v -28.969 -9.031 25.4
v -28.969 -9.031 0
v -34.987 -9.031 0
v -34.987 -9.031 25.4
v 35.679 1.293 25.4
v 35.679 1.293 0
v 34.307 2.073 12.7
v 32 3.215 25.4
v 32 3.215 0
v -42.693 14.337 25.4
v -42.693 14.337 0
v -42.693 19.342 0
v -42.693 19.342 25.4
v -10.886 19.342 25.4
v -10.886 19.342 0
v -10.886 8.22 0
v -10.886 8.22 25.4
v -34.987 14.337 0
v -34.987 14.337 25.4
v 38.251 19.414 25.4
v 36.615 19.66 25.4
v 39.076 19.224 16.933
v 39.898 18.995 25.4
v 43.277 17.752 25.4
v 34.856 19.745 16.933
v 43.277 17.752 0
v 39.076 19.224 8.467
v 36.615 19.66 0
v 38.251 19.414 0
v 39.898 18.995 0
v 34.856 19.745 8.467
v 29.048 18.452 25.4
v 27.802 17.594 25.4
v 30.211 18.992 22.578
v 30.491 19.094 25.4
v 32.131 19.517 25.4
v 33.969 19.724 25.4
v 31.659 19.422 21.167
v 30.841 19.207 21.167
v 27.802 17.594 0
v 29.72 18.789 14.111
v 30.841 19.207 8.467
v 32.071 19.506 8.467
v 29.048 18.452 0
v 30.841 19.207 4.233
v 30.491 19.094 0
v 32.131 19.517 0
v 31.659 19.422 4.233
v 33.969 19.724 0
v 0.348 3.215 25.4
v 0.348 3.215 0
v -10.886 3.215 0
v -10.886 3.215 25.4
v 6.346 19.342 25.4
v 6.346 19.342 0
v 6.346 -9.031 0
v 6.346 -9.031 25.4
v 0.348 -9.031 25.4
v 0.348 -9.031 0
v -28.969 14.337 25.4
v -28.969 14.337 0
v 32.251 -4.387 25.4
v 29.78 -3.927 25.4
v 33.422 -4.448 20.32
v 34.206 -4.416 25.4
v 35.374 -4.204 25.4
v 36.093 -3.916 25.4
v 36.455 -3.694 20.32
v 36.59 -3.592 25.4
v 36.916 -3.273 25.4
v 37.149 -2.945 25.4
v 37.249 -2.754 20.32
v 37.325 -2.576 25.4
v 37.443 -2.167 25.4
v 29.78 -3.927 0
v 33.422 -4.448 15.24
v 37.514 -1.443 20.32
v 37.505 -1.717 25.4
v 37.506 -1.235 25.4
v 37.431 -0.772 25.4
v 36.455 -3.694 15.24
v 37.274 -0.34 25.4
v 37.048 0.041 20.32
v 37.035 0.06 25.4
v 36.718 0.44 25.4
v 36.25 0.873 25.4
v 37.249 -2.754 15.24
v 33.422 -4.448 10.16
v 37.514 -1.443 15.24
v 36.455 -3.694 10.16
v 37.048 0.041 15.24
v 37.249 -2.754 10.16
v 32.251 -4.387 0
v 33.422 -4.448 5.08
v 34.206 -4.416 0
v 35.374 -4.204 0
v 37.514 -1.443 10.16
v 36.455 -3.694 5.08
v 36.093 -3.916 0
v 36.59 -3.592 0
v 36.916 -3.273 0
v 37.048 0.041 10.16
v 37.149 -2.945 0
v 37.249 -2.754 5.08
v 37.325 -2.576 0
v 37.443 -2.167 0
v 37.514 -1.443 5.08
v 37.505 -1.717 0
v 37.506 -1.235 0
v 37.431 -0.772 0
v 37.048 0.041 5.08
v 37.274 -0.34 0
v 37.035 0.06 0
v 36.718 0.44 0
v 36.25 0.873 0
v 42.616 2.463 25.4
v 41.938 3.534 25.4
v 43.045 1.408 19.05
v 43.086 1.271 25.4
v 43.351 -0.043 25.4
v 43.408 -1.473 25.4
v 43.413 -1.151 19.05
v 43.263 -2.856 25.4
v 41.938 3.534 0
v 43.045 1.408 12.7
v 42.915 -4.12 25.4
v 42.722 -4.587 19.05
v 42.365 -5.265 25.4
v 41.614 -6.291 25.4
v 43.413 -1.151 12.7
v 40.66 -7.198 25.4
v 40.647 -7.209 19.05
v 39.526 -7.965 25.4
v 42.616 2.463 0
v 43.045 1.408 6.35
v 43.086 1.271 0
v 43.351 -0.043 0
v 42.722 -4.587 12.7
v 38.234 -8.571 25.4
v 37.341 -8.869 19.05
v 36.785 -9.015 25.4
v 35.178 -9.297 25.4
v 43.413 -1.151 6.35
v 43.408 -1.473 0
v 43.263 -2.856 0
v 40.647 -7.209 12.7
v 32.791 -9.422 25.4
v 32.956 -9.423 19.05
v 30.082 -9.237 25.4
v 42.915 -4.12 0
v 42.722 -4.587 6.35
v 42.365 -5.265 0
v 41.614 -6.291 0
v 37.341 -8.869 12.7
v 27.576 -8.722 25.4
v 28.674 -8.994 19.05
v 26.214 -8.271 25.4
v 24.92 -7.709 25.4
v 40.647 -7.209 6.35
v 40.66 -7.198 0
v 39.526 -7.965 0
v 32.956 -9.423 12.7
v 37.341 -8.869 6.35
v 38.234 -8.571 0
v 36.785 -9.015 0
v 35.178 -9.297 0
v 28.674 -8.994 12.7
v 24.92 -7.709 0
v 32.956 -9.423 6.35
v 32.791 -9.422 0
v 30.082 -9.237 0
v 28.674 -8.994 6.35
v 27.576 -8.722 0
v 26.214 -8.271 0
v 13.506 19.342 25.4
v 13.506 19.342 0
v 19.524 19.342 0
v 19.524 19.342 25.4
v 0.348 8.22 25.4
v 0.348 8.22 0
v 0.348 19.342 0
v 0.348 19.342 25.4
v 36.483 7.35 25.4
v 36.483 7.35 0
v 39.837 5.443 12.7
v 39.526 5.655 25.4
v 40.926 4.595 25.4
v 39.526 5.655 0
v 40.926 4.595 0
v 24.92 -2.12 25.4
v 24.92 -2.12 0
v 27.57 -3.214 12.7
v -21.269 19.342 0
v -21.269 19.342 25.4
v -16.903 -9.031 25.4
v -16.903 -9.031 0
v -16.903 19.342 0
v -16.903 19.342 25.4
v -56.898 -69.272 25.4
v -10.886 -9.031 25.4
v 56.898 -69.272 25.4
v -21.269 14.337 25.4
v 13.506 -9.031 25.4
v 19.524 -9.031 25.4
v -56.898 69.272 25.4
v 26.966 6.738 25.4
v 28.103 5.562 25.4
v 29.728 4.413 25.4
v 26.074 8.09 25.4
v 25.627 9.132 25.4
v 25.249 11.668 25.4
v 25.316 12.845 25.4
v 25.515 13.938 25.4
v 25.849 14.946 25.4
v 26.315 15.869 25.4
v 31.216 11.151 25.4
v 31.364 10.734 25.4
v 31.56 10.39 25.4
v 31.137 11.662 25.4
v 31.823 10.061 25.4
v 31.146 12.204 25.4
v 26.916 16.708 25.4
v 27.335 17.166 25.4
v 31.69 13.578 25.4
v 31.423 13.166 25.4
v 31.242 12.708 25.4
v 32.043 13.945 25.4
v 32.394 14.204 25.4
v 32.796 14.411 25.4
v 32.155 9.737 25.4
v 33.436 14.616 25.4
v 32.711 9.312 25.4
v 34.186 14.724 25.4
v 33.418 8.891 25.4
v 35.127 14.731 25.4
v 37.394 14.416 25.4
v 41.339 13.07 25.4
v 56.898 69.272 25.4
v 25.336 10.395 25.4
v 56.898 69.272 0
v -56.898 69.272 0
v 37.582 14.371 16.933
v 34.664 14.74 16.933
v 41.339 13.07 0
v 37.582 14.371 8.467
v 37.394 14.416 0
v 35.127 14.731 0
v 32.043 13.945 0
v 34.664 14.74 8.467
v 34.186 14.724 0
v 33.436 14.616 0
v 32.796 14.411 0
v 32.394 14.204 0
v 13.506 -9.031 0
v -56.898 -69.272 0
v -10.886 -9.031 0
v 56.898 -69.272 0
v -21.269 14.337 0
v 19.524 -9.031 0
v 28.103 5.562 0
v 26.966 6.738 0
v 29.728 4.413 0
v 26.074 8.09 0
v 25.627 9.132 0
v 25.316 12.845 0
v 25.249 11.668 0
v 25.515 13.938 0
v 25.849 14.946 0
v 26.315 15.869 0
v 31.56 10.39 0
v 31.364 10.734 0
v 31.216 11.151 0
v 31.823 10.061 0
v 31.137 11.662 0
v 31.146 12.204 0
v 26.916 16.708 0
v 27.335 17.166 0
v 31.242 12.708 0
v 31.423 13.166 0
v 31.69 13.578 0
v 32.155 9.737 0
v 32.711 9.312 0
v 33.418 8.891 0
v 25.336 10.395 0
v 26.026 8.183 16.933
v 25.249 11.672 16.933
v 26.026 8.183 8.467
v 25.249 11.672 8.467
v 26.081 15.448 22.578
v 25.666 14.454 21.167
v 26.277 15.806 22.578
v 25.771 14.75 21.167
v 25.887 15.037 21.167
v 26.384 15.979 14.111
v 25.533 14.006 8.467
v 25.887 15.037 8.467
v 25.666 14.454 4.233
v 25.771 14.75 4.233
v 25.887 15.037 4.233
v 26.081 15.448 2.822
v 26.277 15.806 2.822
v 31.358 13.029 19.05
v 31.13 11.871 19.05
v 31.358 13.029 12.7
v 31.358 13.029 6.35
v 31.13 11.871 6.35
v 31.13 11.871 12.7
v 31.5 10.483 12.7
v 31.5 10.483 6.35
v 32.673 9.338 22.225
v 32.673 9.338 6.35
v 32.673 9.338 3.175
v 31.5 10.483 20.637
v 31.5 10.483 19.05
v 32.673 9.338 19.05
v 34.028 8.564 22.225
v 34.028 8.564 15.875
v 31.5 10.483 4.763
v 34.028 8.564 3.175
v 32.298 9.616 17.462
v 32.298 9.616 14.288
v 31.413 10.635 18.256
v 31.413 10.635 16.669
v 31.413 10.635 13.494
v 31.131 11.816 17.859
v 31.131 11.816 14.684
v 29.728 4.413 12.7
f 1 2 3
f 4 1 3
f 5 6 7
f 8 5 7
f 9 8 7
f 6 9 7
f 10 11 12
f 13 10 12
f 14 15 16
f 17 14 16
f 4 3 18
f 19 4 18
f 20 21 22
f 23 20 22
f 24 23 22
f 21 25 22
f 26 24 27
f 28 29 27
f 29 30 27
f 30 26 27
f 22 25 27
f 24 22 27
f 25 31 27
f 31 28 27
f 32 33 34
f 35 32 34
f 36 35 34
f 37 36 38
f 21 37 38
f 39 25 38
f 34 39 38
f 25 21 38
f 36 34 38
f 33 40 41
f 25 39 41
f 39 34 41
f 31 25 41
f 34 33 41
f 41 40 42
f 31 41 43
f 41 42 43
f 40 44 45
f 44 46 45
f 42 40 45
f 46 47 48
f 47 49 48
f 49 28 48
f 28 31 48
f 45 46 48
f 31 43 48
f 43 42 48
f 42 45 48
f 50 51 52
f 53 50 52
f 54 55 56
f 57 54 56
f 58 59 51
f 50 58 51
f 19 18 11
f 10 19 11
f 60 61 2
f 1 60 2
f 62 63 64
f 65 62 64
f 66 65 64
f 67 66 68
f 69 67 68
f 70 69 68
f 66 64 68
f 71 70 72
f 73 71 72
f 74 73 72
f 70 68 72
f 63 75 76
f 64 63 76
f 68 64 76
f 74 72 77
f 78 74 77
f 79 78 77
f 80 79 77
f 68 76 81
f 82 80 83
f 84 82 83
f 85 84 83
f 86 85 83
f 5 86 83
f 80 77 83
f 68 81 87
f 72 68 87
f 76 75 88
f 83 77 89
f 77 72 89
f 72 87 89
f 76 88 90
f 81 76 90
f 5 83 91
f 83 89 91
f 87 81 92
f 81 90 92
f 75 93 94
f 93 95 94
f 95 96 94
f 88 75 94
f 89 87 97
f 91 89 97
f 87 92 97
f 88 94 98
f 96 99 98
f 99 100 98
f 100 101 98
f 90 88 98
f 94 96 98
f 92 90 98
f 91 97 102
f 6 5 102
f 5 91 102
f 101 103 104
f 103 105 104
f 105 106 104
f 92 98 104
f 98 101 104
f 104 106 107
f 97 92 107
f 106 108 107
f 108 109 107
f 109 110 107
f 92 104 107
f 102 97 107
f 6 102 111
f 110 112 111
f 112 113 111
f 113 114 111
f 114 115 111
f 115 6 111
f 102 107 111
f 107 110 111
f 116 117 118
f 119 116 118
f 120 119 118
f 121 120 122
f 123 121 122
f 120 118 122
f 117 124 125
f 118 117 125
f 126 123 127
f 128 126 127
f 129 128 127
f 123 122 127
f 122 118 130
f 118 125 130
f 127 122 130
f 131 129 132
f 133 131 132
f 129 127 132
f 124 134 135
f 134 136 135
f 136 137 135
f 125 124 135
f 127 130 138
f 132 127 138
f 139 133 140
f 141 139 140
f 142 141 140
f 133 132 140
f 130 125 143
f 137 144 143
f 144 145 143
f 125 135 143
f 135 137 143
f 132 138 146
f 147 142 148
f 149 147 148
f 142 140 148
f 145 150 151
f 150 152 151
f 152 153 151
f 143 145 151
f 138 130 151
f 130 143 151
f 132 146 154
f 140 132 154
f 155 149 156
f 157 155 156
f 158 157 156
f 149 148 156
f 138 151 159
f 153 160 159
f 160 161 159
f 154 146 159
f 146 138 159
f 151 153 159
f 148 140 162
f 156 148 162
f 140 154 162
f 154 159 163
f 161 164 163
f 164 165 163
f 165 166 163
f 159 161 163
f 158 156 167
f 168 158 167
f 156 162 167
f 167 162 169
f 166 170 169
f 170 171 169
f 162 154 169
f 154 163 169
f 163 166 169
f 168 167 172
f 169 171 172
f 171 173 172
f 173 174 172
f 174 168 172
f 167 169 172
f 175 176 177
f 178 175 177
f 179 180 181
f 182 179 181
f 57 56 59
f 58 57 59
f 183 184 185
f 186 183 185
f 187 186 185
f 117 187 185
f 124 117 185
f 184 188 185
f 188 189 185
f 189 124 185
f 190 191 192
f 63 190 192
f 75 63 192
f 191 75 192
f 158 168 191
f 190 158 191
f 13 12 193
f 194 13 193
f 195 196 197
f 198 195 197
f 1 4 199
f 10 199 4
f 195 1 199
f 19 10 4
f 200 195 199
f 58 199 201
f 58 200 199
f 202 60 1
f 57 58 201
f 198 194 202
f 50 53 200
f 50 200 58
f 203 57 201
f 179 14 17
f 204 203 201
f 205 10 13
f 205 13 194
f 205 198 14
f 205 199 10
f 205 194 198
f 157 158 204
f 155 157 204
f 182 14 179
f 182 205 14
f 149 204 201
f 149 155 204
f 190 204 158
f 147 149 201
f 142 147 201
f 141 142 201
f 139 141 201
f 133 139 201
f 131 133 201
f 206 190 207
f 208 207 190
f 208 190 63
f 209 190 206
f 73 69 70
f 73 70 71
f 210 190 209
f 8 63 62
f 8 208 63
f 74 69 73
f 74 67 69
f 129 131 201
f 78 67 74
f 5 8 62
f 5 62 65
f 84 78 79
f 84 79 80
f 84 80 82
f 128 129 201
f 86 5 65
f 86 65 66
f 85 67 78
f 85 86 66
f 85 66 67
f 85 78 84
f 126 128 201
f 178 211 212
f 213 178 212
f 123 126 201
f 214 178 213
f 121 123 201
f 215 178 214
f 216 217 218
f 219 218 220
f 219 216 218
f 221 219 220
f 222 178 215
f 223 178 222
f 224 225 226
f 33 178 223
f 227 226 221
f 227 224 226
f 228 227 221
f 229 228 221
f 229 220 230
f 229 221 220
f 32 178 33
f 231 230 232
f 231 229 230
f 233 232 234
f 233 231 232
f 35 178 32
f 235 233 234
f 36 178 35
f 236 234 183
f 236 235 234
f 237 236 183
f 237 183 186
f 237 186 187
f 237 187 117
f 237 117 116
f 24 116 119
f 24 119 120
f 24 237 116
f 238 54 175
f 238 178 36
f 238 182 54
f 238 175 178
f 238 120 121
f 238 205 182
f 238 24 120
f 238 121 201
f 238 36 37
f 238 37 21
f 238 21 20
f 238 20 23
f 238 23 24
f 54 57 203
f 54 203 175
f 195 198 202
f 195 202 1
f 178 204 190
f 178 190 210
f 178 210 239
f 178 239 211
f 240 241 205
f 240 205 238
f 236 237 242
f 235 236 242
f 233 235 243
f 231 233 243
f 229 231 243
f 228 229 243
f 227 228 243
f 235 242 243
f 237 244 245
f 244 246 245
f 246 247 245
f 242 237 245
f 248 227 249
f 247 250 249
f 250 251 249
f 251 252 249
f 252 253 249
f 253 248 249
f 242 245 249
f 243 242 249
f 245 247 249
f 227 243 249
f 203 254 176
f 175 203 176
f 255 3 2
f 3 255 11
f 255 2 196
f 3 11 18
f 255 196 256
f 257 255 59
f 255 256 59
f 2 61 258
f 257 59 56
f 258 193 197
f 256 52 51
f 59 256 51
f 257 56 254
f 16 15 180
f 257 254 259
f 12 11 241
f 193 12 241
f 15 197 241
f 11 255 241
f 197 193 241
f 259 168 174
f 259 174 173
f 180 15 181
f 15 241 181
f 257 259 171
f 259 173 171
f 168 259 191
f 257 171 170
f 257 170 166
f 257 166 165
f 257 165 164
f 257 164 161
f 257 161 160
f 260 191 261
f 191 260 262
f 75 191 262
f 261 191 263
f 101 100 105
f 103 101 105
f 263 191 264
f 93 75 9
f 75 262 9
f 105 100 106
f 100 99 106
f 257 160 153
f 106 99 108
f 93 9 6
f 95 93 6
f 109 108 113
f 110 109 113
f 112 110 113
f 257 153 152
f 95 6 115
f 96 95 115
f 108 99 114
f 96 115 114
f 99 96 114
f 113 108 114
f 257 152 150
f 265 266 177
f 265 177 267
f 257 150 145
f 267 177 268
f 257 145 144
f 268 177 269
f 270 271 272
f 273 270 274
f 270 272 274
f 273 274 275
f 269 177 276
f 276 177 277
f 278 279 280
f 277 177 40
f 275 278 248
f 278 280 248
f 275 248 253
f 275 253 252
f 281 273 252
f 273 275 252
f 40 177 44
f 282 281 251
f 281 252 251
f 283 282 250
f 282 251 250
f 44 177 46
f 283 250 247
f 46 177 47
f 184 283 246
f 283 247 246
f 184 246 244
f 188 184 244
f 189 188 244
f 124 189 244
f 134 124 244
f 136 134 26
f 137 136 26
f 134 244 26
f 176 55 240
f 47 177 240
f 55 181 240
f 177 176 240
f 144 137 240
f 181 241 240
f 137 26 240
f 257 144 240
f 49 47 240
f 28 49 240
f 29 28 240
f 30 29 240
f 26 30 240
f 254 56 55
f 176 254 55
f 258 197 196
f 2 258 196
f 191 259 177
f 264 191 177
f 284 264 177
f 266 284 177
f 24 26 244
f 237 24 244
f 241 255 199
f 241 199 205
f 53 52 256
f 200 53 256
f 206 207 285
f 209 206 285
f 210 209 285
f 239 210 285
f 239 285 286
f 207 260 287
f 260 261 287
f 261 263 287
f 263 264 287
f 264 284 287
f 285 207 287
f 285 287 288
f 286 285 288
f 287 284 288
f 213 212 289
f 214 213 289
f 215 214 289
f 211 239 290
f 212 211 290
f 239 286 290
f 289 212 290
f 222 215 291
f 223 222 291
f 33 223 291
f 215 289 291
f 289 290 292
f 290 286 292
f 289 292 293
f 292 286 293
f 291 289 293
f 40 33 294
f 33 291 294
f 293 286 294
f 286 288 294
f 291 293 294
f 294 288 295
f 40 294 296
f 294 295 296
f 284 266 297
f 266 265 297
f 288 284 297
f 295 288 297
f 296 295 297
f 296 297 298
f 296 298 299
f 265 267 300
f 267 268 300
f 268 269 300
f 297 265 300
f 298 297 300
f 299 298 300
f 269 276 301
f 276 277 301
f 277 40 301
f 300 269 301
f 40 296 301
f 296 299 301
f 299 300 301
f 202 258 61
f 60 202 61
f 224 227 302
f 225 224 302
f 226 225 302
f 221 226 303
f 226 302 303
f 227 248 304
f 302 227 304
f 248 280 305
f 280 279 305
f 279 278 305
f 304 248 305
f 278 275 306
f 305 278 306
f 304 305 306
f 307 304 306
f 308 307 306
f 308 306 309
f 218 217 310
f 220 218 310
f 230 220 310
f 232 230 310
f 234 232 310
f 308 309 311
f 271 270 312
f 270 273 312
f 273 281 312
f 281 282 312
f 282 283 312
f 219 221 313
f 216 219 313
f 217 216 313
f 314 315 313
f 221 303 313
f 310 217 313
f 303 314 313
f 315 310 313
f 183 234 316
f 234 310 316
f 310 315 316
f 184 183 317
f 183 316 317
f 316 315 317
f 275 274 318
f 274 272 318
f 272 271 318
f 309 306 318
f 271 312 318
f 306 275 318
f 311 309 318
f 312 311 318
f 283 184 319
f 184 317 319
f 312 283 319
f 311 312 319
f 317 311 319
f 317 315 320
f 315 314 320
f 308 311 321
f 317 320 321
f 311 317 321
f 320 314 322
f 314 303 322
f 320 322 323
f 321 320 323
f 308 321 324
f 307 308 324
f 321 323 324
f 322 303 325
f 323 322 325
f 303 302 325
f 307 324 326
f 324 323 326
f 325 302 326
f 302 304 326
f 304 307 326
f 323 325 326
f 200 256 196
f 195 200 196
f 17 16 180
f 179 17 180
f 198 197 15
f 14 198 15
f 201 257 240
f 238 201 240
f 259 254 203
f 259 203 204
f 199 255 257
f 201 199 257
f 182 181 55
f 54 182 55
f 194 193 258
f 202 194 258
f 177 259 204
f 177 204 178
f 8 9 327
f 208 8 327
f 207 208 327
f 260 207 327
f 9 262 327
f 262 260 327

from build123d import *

# Parameters (mm, degrees)
F0_W     = 113.7968078256
F0_H     = 138.5442316532
F0_W_2   = 6.0173892501
F0_H_2   = 28.373014947
F1_DEPTH = 25.4


with BuildPart() as f1:
    # F0 (on Top) → F1 (new body)
    with BuildSketch(Plane.XY):
        Rectangle(F0_W, F0_H)
        Polygon((-28.96920121, 14.3365136363), (-28.96920121, -9.031325113), (-34.9865904601, -9.031325113), (-34.9865904601, 14.3365136363), (-42.6930714295, 14.3365136363), (-42.6930714295, 19.341689834), (-21.2689301366, 19.341689834), (-21.2689301366, 14.3365136363), align=None, mode=Mode.SUBTRACT)
        Polygon((6.3464774951, 19.341689834), (6.3464774951, -9.031325113), (0.3477179331, -9.031325113), (0.3477179331, 3.2145898521), (-10.8859839796, 3.2145898521), (-10.8859839796, -9.031325113), (-16.9033732297, -9.031325113), (-16.9033732297, 19.341689834), (-10.8859839796, 19.341689834), (-10.8859839796, 8.2197660498), (0.3477179331, 8.2197660498), (0.3477179331, 19.341689834), align=None, mode=Mode.SUBTRACT)
        with Locations((16.5151822392, 5.1551823605)):
            Rectangle(F0_W_2, F0_H_2, mode=Mode.SUBTRACT)
        with BuildLine():
            add(Edge.make_bspline(
                [(41.9384965735, 3.5343994975), (43.4133468799, 1.6248564692), (43.4133468799, -1.1509670549)],
                knots=[0, 0, 0, 1, 1, 1], degree=2))
            add(Edge.make_bspline(
                [(43.4133468799, -1.1509670549), (43.4133468799, -4.9948926955), (40.6468381999, -7.2087206291)],
                knots=[0, 0, 0, 1, 1, 1], degree=2))
            add(Edge.make_bspline(
                [(40.6468381999, -7.2087206291), (37.8803295199, -9.4225485627), (32.9558819705, -9.4225485627)],
                knots=[0, 0, 0, 1, 1, 1], degree=2))
            add(Edge.make_bspline(
                [(32.9558819705, -9.4225485627), (28.4102380788, -9.4225485627), (24.9202765117, -7.7086172593)],
                knots=[0, 0, 0, 1, 1, 1], degree=2))
            Line((24.9202765117, -7.7086172593), (24.9202765117, -2.1197108351))
            add(Edge.make_bspline(
                [(24.9202765117, -2.1197108351), (27.7892484761, -3.4051593126), (29.7795201528, -3.9267905789)],
                knots=[0, 0, 0, 1, 1, 1], degree=2))
            add(Edge.make_bspline(
                [(29.7795201528, -3.9267905789), (31.7697918294, -4.4484218452), (33.4216241726, -4.4484218452)],
                knots=[0, 0, 0, 1, 1, 1], degree=2))
            add(Edge.make_bspline(
                [(33.4216241726, -4.4484218452), (35.3963711091, -4.4484218452), (36.4551583817, -3.6939194779)],
                knots=[0, 0, 0, 1, 1, 1], degree=2))
            add(Edge.make_bspline(
                [(36.4551583817, -3.6939194779), (37.5139456543, -2.9394171106), (37.5139456543, -1.4428321681)],
                knots=[0, 0, 0, 1, 1, 1], degree=2))
            add(Edge.make_bspline(
                [(37.5139456543, -1.4428321681), (37.5139456543, -0.6107061005), (37.0482034523, 0.0413329823)],
                knots=[0, 0, 0, 1, 1, 1], degree=2))
            add(Edge.make_bspline(
                [(37.0482034523, 0.0413329823), (36.5824612503, 0.6933720651), (35.6789213783, 1.2926270317)],
                knots=[0, 0, 0, 1, 1, 1], degree=2))
            add(Edge.make_bspline(
                [(35.6789213783, 1.2926270317), (34.7753815064, 1.8918819983), (31.9995579824, 3.2145898521)],
                knots=[0, 0, 0, 1, 1, 1], degree=2))
            add(Edge.make_bspline(
                [(31.9995579824, 3.2145898521), (29.4038214431, 4.4379393694), (28.1028482255, 5.5619305503)],
                knots=[0, 0, 0, 1, 1, 1], degree=2))
            add(Edge.make_bspline(
                [(28.1028482255, 5.5619305503), (26.8018750079, 6.6859217311), (26.0256380045, 8.1825066736)],
                knots=[0, 0, 0, 1, 1, 1], degree=2))
            add(Edge.make_bspline(
                [(26.0256380045, 8.1825066736), (25.2494010011, 9.6790916161), (25.2494010011, 11.6724682408)],
                knots=[0, 0, 0, 1, 1, 1], degree=2))
            add(Edge.make_bspline(
                [(25.2494010011, 11.6724682408), (25.2494010011, 15.4418751291), (27.8016682682, 17.5936041024)],
                knots=[0, 0, 0, 1, 1, 1], degree=2))
            add(Edge.make_bspline(
                [(27.8016682682, 17.5936041024), (30.3539355353, 19.7453330758), (34.8561101548, 19.7453330758)],
                knots=[0, 0, 0, 1, 1, 1], degree=2))
            add(Edge.make_bspline(
                [(34.8561101548, 19.7453330758), (37.0668331404, 19.7453330758), (39.0757345051, 19.2237018095)],
                knots=[0, 0, 0, 1, 1, 1], degree=2))
            add(Edge.make_bspline(
                [(39.0757345051, 19.2237018095), (41.0846358698, 18.7020705432), (43.2767291673, 17.7519564511)],
                knots=[0, 0, 0, 1, 1, 1], degree=2))
            Line((43.2767291673, 17.7519564511), (41.3392416069, 13.0696948468))
            add(Edge.make_bspline(
                [(41.3392416069, 13.0696948468), (39.066419661, 14.0011792509), (37.5822545106, 14.3706680645)],
                knots=[0, 0, 0, 1, 1, 1], degree=2))
            add(Edge.make_bspline(
                [(37.5822545106, 14.3706680645), (36.0980893602, 14.7401568781), (34.6636033779, 14.7401568781)],
                knots=[0, 0, 0, 1, 1, 1], degree=2))
            add(Edge.make_bspline(
                [(34.6636033779, 14.7401568781), (32.9558819705, 14.7401568781), (32.0430272546, 13.9452901866)],
                knots=[0, 0, 0, 1, 1, 1], degree=2))
            add(Edge.make_bspline(
                [(32.0430272546, 13.9452901866), (31.1301725386, 13.1504234952), (31.1301725386, 11.8711849136)],
                knots=[0, 0, 0, 1, 1, 1], degree=2))
            add(Edge.make_bspline(
                [(31.1301725386, 11.8711849136), (31.1301725386, 11.0763182222), (31.4996613522, 10.4832731516)],
                knots=[0, 0, 0, 1, 1, 1], degree=2))
            add(Edge.make_bspline(
                [(31.4996613522, 10.4832731516), (31.8691501658, 9.890228081), (32.6733317013, 9.3375473346)],
                knots=[0, 0, 0, 1, 1, 1], degree=2))
            add(Edge.make_bspline(
                [(32.6733317013, 9.3375473346), (33.4775132368, 8.7848665882), (36.4831029138, 7.350380606)],
                knots=[0, 0, 0, 1, 1, 1], degree=2))
            add(Edge.make_bspline(
                [(36.4831029138, 7.350380606), (40.4636462671, 5.4439425257), (41.9384965735, 3.5343994975)],
                knots=[0, 0, 0, 1, 1, 1], degree=2))
        make_face(mode=Mode.SUBTRACT)
    extrude(amount=F1_DEPTH)


solid = f1.part
